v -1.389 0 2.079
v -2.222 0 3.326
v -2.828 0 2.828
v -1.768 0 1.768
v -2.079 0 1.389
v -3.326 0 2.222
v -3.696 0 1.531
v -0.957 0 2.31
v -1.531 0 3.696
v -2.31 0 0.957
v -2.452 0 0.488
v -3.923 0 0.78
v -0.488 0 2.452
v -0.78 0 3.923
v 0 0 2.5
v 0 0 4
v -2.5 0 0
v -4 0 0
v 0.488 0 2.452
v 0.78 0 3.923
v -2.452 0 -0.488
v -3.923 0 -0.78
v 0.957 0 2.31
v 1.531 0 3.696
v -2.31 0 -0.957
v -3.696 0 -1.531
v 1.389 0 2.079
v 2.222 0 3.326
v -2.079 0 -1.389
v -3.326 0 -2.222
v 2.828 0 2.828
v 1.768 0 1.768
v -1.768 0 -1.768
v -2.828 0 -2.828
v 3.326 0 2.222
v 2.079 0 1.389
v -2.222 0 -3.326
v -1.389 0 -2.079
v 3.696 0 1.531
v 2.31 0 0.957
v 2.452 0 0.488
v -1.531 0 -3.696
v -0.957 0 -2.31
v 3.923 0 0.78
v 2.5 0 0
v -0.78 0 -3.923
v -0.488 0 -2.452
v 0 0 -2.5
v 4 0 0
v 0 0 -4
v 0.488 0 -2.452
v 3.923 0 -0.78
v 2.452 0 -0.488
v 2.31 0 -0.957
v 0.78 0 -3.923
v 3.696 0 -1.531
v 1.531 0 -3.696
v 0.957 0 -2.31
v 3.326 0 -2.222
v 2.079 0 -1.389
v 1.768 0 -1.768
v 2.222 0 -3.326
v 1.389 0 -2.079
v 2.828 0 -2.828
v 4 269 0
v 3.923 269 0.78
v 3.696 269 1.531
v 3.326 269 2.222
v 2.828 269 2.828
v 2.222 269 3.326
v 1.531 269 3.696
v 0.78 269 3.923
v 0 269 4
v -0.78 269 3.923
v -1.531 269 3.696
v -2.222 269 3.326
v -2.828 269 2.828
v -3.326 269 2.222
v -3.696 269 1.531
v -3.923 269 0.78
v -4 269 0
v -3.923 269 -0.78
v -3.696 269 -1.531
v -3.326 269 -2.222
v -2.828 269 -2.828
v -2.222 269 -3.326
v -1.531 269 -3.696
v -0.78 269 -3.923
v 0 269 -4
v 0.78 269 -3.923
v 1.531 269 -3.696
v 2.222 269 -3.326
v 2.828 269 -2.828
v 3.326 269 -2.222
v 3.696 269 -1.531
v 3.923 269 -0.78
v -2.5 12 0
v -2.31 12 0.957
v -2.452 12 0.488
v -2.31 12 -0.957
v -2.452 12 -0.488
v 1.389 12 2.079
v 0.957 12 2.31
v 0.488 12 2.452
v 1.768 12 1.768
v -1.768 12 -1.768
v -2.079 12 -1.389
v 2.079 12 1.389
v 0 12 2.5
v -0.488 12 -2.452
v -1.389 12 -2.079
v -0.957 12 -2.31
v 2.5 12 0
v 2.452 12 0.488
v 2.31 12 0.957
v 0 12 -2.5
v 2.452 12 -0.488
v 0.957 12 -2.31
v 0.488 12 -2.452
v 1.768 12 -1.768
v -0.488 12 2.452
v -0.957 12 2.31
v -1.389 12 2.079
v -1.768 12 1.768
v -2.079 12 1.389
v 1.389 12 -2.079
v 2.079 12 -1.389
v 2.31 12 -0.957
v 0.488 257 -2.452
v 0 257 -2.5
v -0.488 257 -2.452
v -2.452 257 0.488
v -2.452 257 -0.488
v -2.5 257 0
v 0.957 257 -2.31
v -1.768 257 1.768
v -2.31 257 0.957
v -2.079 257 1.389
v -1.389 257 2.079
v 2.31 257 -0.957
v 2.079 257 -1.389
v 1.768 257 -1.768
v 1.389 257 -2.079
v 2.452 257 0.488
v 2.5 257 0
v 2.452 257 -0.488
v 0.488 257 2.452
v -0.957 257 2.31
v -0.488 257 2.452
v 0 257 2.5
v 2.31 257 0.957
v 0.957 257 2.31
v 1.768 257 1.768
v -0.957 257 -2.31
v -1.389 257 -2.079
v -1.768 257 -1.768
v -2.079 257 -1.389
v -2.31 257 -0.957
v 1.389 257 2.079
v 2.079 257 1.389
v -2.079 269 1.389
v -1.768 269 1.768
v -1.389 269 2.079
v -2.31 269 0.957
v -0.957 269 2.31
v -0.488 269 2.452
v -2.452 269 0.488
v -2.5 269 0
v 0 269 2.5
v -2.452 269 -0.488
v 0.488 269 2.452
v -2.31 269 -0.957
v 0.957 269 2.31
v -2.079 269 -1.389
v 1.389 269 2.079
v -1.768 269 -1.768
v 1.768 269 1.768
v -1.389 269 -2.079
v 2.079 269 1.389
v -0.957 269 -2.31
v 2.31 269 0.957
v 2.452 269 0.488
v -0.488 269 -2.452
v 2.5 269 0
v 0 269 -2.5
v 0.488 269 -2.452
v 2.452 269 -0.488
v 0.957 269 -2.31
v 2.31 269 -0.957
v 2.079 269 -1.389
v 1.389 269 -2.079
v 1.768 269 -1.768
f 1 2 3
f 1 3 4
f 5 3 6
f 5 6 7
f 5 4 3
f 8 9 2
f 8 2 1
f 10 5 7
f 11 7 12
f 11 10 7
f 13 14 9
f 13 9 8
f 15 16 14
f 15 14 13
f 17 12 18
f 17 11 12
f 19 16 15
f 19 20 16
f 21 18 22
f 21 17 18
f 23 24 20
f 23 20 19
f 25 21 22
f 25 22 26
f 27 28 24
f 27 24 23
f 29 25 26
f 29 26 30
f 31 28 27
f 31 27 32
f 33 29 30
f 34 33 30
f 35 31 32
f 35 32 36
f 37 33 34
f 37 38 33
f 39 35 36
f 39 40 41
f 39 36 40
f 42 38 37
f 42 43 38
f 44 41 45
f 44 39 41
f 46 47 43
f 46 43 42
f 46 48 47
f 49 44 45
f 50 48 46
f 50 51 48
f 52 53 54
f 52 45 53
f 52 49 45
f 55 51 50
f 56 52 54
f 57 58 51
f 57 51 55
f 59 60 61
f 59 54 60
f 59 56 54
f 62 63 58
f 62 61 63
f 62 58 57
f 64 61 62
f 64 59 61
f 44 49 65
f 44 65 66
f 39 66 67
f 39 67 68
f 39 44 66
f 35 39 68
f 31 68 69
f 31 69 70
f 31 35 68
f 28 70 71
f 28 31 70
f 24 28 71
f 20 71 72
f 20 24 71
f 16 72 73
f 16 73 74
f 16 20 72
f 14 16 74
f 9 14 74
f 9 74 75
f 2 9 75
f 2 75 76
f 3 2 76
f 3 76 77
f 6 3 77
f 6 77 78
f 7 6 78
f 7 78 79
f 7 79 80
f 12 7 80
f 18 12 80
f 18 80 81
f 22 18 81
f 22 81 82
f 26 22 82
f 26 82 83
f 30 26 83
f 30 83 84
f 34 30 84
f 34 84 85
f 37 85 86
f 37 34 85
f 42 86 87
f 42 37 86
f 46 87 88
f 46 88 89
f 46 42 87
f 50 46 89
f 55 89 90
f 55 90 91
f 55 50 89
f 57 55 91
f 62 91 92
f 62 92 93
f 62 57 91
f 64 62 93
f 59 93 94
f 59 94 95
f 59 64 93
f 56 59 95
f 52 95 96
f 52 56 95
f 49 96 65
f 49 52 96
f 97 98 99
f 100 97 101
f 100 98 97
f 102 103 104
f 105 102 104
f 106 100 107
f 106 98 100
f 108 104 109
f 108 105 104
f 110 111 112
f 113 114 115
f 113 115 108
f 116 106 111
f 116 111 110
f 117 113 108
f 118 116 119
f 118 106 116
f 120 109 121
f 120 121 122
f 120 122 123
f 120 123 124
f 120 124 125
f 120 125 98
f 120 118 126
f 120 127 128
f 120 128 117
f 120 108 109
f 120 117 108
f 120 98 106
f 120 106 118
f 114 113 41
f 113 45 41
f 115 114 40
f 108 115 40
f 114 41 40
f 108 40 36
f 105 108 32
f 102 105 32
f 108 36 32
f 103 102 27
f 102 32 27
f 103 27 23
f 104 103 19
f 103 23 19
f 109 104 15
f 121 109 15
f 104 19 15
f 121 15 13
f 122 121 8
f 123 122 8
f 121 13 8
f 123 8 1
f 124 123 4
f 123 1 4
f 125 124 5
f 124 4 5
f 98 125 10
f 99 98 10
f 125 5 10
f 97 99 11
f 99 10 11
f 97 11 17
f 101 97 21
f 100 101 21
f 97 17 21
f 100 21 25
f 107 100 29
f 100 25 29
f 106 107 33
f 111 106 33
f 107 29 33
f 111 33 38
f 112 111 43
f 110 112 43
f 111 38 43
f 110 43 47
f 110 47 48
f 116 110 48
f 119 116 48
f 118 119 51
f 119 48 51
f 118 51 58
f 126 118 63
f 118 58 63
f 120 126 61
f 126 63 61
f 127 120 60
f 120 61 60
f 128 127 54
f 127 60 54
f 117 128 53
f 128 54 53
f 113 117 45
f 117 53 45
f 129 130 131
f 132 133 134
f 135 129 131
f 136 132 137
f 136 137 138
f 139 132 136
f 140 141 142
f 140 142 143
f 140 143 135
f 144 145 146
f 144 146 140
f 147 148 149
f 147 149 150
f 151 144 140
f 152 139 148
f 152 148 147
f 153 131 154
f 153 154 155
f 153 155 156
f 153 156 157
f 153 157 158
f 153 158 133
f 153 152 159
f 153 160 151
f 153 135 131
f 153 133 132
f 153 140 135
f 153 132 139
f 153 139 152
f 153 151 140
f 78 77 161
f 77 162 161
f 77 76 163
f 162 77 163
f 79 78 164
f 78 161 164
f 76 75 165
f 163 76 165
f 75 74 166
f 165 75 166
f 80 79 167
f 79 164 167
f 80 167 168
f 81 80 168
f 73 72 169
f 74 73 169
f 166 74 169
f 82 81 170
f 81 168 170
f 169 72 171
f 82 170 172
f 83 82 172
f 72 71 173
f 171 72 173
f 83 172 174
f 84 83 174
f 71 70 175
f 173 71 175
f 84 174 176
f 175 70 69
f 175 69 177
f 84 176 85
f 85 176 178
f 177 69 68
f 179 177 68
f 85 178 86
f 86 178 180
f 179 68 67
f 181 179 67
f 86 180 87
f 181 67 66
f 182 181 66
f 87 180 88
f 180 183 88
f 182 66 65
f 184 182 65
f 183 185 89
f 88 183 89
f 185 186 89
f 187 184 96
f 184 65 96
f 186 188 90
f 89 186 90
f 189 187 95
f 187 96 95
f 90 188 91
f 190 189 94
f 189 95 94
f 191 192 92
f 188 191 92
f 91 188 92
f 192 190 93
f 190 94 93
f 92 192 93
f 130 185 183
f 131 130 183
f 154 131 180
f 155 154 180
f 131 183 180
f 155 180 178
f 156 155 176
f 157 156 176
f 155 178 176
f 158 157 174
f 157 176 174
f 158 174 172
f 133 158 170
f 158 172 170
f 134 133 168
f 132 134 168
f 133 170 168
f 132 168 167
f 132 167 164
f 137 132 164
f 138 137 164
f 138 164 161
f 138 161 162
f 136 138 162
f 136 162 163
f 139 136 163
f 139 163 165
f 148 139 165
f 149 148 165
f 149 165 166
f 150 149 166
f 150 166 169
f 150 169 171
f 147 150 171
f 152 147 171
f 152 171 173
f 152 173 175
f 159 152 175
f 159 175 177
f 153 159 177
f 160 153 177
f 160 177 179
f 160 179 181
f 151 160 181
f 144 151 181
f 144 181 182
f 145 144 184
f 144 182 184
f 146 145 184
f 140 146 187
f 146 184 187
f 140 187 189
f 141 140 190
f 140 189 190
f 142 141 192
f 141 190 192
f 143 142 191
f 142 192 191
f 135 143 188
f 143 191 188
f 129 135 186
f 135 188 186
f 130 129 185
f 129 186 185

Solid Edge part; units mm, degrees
sketch "Sketch1" plane through (0, 0, 0) normal (0, -1, 0) x (1, 0, 0)
  circle A0 centre (0, 0) radius 4
extrude "Protrusion1" add sketch "Sketch1" against normal blind 269
sketch "Sketch2" plane through (0, 269, 0) normal (0, 1, 0) x (0, 0, -1)
  circle A0 centre (0, 0) radius 2.5
extrude "ExtrudedCutout_2" cut sketch "Sketch2" against normal blind 12
sketch "Sketch3" plane through (0, 0, 0) normal (0, -1, 0) x (1, 0, 0)
  circle A0 centre (0, 0) radius 2.5
extrude "ExtrudedCutout_3" cut sketch "Sketch3" against normal blind 12
cosmetic_thread "Thread1" size "M5"
cosmetic_thread "Thread2" size "M5"
properties material "Steel"
